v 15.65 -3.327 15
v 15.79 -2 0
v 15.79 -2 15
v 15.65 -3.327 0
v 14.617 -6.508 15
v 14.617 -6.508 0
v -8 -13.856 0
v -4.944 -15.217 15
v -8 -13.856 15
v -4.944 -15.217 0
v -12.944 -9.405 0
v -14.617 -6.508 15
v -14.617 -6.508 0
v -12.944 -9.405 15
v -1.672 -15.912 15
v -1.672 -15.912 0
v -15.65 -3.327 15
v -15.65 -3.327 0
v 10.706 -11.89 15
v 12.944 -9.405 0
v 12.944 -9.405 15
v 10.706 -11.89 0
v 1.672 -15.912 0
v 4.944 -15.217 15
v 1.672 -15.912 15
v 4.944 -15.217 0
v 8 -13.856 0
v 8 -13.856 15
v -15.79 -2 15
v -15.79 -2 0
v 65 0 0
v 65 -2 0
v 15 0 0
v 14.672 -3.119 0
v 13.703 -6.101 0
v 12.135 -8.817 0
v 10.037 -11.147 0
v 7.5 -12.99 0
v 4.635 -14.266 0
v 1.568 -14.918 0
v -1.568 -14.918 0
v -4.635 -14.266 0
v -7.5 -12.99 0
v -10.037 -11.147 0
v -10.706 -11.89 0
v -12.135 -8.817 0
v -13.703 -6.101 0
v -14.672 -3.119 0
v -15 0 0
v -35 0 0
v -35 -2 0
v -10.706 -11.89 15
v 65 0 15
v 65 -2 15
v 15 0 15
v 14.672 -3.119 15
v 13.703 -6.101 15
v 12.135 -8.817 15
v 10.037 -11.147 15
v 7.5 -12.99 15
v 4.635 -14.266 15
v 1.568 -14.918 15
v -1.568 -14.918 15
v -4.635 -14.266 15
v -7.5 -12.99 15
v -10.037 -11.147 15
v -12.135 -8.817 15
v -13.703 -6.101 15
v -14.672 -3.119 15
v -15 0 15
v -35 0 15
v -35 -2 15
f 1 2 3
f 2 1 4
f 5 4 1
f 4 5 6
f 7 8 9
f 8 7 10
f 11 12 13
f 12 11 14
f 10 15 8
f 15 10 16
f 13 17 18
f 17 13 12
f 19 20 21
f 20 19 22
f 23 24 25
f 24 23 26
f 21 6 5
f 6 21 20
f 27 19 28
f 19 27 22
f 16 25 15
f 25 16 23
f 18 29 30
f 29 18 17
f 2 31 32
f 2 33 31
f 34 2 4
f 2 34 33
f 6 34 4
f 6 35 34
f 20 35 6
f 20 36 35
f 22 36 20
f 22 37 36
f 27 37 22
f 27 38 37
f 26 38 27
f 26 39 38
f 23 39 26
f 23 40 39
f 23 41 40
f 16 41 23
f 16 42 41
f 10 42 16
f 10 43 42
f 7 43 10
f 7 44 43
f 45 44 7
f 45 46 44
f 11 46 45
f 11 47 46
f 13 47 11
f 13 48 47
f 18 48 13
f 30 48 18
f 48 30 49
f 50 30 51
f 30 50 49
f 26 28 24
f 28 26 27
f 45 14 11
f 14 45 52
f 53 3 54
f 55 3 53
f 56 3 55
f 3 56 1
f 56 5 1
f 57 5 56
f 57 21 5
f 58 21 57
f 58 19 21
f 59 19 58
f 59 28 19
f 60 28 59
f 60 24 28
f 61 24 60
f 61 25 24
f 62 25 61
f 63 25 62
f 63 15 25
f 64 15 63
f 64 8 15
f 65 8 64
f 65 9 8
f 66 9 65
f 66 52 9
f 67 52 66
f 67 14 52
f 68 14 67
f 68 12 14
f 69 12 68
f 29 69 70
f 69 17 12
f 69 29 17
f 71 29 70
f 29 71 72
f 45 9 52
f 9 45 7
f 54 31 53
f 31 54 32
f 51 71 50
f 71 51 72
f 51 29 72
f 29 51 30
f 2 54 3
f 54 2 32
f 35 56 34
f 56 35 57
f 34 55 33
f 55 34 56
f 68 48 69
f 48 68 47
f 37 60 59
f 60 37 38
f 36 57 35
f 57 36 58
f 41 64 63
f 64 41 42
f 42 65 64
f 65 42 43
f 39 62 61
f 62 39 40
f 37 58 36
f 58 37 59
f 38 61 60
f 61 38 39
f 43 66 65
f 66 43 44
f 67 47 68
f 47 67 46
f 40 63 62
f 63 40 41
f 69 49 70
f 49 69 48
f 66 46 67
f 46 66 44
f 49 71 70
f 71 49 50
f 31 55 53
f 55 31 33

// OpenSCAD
difference() {
	union() {
		difference() {
			union() {
				cylinder(h = 15, r=16, center=false);
				translate([-35,-2,0]) cube([100,20,15]);
			}
			translate([0,0,-5]) cylinder(h = 25, r=15, center=false);
		}
		
	}

	translate([-50,0,-10]) cube([200,40,40]);
}
